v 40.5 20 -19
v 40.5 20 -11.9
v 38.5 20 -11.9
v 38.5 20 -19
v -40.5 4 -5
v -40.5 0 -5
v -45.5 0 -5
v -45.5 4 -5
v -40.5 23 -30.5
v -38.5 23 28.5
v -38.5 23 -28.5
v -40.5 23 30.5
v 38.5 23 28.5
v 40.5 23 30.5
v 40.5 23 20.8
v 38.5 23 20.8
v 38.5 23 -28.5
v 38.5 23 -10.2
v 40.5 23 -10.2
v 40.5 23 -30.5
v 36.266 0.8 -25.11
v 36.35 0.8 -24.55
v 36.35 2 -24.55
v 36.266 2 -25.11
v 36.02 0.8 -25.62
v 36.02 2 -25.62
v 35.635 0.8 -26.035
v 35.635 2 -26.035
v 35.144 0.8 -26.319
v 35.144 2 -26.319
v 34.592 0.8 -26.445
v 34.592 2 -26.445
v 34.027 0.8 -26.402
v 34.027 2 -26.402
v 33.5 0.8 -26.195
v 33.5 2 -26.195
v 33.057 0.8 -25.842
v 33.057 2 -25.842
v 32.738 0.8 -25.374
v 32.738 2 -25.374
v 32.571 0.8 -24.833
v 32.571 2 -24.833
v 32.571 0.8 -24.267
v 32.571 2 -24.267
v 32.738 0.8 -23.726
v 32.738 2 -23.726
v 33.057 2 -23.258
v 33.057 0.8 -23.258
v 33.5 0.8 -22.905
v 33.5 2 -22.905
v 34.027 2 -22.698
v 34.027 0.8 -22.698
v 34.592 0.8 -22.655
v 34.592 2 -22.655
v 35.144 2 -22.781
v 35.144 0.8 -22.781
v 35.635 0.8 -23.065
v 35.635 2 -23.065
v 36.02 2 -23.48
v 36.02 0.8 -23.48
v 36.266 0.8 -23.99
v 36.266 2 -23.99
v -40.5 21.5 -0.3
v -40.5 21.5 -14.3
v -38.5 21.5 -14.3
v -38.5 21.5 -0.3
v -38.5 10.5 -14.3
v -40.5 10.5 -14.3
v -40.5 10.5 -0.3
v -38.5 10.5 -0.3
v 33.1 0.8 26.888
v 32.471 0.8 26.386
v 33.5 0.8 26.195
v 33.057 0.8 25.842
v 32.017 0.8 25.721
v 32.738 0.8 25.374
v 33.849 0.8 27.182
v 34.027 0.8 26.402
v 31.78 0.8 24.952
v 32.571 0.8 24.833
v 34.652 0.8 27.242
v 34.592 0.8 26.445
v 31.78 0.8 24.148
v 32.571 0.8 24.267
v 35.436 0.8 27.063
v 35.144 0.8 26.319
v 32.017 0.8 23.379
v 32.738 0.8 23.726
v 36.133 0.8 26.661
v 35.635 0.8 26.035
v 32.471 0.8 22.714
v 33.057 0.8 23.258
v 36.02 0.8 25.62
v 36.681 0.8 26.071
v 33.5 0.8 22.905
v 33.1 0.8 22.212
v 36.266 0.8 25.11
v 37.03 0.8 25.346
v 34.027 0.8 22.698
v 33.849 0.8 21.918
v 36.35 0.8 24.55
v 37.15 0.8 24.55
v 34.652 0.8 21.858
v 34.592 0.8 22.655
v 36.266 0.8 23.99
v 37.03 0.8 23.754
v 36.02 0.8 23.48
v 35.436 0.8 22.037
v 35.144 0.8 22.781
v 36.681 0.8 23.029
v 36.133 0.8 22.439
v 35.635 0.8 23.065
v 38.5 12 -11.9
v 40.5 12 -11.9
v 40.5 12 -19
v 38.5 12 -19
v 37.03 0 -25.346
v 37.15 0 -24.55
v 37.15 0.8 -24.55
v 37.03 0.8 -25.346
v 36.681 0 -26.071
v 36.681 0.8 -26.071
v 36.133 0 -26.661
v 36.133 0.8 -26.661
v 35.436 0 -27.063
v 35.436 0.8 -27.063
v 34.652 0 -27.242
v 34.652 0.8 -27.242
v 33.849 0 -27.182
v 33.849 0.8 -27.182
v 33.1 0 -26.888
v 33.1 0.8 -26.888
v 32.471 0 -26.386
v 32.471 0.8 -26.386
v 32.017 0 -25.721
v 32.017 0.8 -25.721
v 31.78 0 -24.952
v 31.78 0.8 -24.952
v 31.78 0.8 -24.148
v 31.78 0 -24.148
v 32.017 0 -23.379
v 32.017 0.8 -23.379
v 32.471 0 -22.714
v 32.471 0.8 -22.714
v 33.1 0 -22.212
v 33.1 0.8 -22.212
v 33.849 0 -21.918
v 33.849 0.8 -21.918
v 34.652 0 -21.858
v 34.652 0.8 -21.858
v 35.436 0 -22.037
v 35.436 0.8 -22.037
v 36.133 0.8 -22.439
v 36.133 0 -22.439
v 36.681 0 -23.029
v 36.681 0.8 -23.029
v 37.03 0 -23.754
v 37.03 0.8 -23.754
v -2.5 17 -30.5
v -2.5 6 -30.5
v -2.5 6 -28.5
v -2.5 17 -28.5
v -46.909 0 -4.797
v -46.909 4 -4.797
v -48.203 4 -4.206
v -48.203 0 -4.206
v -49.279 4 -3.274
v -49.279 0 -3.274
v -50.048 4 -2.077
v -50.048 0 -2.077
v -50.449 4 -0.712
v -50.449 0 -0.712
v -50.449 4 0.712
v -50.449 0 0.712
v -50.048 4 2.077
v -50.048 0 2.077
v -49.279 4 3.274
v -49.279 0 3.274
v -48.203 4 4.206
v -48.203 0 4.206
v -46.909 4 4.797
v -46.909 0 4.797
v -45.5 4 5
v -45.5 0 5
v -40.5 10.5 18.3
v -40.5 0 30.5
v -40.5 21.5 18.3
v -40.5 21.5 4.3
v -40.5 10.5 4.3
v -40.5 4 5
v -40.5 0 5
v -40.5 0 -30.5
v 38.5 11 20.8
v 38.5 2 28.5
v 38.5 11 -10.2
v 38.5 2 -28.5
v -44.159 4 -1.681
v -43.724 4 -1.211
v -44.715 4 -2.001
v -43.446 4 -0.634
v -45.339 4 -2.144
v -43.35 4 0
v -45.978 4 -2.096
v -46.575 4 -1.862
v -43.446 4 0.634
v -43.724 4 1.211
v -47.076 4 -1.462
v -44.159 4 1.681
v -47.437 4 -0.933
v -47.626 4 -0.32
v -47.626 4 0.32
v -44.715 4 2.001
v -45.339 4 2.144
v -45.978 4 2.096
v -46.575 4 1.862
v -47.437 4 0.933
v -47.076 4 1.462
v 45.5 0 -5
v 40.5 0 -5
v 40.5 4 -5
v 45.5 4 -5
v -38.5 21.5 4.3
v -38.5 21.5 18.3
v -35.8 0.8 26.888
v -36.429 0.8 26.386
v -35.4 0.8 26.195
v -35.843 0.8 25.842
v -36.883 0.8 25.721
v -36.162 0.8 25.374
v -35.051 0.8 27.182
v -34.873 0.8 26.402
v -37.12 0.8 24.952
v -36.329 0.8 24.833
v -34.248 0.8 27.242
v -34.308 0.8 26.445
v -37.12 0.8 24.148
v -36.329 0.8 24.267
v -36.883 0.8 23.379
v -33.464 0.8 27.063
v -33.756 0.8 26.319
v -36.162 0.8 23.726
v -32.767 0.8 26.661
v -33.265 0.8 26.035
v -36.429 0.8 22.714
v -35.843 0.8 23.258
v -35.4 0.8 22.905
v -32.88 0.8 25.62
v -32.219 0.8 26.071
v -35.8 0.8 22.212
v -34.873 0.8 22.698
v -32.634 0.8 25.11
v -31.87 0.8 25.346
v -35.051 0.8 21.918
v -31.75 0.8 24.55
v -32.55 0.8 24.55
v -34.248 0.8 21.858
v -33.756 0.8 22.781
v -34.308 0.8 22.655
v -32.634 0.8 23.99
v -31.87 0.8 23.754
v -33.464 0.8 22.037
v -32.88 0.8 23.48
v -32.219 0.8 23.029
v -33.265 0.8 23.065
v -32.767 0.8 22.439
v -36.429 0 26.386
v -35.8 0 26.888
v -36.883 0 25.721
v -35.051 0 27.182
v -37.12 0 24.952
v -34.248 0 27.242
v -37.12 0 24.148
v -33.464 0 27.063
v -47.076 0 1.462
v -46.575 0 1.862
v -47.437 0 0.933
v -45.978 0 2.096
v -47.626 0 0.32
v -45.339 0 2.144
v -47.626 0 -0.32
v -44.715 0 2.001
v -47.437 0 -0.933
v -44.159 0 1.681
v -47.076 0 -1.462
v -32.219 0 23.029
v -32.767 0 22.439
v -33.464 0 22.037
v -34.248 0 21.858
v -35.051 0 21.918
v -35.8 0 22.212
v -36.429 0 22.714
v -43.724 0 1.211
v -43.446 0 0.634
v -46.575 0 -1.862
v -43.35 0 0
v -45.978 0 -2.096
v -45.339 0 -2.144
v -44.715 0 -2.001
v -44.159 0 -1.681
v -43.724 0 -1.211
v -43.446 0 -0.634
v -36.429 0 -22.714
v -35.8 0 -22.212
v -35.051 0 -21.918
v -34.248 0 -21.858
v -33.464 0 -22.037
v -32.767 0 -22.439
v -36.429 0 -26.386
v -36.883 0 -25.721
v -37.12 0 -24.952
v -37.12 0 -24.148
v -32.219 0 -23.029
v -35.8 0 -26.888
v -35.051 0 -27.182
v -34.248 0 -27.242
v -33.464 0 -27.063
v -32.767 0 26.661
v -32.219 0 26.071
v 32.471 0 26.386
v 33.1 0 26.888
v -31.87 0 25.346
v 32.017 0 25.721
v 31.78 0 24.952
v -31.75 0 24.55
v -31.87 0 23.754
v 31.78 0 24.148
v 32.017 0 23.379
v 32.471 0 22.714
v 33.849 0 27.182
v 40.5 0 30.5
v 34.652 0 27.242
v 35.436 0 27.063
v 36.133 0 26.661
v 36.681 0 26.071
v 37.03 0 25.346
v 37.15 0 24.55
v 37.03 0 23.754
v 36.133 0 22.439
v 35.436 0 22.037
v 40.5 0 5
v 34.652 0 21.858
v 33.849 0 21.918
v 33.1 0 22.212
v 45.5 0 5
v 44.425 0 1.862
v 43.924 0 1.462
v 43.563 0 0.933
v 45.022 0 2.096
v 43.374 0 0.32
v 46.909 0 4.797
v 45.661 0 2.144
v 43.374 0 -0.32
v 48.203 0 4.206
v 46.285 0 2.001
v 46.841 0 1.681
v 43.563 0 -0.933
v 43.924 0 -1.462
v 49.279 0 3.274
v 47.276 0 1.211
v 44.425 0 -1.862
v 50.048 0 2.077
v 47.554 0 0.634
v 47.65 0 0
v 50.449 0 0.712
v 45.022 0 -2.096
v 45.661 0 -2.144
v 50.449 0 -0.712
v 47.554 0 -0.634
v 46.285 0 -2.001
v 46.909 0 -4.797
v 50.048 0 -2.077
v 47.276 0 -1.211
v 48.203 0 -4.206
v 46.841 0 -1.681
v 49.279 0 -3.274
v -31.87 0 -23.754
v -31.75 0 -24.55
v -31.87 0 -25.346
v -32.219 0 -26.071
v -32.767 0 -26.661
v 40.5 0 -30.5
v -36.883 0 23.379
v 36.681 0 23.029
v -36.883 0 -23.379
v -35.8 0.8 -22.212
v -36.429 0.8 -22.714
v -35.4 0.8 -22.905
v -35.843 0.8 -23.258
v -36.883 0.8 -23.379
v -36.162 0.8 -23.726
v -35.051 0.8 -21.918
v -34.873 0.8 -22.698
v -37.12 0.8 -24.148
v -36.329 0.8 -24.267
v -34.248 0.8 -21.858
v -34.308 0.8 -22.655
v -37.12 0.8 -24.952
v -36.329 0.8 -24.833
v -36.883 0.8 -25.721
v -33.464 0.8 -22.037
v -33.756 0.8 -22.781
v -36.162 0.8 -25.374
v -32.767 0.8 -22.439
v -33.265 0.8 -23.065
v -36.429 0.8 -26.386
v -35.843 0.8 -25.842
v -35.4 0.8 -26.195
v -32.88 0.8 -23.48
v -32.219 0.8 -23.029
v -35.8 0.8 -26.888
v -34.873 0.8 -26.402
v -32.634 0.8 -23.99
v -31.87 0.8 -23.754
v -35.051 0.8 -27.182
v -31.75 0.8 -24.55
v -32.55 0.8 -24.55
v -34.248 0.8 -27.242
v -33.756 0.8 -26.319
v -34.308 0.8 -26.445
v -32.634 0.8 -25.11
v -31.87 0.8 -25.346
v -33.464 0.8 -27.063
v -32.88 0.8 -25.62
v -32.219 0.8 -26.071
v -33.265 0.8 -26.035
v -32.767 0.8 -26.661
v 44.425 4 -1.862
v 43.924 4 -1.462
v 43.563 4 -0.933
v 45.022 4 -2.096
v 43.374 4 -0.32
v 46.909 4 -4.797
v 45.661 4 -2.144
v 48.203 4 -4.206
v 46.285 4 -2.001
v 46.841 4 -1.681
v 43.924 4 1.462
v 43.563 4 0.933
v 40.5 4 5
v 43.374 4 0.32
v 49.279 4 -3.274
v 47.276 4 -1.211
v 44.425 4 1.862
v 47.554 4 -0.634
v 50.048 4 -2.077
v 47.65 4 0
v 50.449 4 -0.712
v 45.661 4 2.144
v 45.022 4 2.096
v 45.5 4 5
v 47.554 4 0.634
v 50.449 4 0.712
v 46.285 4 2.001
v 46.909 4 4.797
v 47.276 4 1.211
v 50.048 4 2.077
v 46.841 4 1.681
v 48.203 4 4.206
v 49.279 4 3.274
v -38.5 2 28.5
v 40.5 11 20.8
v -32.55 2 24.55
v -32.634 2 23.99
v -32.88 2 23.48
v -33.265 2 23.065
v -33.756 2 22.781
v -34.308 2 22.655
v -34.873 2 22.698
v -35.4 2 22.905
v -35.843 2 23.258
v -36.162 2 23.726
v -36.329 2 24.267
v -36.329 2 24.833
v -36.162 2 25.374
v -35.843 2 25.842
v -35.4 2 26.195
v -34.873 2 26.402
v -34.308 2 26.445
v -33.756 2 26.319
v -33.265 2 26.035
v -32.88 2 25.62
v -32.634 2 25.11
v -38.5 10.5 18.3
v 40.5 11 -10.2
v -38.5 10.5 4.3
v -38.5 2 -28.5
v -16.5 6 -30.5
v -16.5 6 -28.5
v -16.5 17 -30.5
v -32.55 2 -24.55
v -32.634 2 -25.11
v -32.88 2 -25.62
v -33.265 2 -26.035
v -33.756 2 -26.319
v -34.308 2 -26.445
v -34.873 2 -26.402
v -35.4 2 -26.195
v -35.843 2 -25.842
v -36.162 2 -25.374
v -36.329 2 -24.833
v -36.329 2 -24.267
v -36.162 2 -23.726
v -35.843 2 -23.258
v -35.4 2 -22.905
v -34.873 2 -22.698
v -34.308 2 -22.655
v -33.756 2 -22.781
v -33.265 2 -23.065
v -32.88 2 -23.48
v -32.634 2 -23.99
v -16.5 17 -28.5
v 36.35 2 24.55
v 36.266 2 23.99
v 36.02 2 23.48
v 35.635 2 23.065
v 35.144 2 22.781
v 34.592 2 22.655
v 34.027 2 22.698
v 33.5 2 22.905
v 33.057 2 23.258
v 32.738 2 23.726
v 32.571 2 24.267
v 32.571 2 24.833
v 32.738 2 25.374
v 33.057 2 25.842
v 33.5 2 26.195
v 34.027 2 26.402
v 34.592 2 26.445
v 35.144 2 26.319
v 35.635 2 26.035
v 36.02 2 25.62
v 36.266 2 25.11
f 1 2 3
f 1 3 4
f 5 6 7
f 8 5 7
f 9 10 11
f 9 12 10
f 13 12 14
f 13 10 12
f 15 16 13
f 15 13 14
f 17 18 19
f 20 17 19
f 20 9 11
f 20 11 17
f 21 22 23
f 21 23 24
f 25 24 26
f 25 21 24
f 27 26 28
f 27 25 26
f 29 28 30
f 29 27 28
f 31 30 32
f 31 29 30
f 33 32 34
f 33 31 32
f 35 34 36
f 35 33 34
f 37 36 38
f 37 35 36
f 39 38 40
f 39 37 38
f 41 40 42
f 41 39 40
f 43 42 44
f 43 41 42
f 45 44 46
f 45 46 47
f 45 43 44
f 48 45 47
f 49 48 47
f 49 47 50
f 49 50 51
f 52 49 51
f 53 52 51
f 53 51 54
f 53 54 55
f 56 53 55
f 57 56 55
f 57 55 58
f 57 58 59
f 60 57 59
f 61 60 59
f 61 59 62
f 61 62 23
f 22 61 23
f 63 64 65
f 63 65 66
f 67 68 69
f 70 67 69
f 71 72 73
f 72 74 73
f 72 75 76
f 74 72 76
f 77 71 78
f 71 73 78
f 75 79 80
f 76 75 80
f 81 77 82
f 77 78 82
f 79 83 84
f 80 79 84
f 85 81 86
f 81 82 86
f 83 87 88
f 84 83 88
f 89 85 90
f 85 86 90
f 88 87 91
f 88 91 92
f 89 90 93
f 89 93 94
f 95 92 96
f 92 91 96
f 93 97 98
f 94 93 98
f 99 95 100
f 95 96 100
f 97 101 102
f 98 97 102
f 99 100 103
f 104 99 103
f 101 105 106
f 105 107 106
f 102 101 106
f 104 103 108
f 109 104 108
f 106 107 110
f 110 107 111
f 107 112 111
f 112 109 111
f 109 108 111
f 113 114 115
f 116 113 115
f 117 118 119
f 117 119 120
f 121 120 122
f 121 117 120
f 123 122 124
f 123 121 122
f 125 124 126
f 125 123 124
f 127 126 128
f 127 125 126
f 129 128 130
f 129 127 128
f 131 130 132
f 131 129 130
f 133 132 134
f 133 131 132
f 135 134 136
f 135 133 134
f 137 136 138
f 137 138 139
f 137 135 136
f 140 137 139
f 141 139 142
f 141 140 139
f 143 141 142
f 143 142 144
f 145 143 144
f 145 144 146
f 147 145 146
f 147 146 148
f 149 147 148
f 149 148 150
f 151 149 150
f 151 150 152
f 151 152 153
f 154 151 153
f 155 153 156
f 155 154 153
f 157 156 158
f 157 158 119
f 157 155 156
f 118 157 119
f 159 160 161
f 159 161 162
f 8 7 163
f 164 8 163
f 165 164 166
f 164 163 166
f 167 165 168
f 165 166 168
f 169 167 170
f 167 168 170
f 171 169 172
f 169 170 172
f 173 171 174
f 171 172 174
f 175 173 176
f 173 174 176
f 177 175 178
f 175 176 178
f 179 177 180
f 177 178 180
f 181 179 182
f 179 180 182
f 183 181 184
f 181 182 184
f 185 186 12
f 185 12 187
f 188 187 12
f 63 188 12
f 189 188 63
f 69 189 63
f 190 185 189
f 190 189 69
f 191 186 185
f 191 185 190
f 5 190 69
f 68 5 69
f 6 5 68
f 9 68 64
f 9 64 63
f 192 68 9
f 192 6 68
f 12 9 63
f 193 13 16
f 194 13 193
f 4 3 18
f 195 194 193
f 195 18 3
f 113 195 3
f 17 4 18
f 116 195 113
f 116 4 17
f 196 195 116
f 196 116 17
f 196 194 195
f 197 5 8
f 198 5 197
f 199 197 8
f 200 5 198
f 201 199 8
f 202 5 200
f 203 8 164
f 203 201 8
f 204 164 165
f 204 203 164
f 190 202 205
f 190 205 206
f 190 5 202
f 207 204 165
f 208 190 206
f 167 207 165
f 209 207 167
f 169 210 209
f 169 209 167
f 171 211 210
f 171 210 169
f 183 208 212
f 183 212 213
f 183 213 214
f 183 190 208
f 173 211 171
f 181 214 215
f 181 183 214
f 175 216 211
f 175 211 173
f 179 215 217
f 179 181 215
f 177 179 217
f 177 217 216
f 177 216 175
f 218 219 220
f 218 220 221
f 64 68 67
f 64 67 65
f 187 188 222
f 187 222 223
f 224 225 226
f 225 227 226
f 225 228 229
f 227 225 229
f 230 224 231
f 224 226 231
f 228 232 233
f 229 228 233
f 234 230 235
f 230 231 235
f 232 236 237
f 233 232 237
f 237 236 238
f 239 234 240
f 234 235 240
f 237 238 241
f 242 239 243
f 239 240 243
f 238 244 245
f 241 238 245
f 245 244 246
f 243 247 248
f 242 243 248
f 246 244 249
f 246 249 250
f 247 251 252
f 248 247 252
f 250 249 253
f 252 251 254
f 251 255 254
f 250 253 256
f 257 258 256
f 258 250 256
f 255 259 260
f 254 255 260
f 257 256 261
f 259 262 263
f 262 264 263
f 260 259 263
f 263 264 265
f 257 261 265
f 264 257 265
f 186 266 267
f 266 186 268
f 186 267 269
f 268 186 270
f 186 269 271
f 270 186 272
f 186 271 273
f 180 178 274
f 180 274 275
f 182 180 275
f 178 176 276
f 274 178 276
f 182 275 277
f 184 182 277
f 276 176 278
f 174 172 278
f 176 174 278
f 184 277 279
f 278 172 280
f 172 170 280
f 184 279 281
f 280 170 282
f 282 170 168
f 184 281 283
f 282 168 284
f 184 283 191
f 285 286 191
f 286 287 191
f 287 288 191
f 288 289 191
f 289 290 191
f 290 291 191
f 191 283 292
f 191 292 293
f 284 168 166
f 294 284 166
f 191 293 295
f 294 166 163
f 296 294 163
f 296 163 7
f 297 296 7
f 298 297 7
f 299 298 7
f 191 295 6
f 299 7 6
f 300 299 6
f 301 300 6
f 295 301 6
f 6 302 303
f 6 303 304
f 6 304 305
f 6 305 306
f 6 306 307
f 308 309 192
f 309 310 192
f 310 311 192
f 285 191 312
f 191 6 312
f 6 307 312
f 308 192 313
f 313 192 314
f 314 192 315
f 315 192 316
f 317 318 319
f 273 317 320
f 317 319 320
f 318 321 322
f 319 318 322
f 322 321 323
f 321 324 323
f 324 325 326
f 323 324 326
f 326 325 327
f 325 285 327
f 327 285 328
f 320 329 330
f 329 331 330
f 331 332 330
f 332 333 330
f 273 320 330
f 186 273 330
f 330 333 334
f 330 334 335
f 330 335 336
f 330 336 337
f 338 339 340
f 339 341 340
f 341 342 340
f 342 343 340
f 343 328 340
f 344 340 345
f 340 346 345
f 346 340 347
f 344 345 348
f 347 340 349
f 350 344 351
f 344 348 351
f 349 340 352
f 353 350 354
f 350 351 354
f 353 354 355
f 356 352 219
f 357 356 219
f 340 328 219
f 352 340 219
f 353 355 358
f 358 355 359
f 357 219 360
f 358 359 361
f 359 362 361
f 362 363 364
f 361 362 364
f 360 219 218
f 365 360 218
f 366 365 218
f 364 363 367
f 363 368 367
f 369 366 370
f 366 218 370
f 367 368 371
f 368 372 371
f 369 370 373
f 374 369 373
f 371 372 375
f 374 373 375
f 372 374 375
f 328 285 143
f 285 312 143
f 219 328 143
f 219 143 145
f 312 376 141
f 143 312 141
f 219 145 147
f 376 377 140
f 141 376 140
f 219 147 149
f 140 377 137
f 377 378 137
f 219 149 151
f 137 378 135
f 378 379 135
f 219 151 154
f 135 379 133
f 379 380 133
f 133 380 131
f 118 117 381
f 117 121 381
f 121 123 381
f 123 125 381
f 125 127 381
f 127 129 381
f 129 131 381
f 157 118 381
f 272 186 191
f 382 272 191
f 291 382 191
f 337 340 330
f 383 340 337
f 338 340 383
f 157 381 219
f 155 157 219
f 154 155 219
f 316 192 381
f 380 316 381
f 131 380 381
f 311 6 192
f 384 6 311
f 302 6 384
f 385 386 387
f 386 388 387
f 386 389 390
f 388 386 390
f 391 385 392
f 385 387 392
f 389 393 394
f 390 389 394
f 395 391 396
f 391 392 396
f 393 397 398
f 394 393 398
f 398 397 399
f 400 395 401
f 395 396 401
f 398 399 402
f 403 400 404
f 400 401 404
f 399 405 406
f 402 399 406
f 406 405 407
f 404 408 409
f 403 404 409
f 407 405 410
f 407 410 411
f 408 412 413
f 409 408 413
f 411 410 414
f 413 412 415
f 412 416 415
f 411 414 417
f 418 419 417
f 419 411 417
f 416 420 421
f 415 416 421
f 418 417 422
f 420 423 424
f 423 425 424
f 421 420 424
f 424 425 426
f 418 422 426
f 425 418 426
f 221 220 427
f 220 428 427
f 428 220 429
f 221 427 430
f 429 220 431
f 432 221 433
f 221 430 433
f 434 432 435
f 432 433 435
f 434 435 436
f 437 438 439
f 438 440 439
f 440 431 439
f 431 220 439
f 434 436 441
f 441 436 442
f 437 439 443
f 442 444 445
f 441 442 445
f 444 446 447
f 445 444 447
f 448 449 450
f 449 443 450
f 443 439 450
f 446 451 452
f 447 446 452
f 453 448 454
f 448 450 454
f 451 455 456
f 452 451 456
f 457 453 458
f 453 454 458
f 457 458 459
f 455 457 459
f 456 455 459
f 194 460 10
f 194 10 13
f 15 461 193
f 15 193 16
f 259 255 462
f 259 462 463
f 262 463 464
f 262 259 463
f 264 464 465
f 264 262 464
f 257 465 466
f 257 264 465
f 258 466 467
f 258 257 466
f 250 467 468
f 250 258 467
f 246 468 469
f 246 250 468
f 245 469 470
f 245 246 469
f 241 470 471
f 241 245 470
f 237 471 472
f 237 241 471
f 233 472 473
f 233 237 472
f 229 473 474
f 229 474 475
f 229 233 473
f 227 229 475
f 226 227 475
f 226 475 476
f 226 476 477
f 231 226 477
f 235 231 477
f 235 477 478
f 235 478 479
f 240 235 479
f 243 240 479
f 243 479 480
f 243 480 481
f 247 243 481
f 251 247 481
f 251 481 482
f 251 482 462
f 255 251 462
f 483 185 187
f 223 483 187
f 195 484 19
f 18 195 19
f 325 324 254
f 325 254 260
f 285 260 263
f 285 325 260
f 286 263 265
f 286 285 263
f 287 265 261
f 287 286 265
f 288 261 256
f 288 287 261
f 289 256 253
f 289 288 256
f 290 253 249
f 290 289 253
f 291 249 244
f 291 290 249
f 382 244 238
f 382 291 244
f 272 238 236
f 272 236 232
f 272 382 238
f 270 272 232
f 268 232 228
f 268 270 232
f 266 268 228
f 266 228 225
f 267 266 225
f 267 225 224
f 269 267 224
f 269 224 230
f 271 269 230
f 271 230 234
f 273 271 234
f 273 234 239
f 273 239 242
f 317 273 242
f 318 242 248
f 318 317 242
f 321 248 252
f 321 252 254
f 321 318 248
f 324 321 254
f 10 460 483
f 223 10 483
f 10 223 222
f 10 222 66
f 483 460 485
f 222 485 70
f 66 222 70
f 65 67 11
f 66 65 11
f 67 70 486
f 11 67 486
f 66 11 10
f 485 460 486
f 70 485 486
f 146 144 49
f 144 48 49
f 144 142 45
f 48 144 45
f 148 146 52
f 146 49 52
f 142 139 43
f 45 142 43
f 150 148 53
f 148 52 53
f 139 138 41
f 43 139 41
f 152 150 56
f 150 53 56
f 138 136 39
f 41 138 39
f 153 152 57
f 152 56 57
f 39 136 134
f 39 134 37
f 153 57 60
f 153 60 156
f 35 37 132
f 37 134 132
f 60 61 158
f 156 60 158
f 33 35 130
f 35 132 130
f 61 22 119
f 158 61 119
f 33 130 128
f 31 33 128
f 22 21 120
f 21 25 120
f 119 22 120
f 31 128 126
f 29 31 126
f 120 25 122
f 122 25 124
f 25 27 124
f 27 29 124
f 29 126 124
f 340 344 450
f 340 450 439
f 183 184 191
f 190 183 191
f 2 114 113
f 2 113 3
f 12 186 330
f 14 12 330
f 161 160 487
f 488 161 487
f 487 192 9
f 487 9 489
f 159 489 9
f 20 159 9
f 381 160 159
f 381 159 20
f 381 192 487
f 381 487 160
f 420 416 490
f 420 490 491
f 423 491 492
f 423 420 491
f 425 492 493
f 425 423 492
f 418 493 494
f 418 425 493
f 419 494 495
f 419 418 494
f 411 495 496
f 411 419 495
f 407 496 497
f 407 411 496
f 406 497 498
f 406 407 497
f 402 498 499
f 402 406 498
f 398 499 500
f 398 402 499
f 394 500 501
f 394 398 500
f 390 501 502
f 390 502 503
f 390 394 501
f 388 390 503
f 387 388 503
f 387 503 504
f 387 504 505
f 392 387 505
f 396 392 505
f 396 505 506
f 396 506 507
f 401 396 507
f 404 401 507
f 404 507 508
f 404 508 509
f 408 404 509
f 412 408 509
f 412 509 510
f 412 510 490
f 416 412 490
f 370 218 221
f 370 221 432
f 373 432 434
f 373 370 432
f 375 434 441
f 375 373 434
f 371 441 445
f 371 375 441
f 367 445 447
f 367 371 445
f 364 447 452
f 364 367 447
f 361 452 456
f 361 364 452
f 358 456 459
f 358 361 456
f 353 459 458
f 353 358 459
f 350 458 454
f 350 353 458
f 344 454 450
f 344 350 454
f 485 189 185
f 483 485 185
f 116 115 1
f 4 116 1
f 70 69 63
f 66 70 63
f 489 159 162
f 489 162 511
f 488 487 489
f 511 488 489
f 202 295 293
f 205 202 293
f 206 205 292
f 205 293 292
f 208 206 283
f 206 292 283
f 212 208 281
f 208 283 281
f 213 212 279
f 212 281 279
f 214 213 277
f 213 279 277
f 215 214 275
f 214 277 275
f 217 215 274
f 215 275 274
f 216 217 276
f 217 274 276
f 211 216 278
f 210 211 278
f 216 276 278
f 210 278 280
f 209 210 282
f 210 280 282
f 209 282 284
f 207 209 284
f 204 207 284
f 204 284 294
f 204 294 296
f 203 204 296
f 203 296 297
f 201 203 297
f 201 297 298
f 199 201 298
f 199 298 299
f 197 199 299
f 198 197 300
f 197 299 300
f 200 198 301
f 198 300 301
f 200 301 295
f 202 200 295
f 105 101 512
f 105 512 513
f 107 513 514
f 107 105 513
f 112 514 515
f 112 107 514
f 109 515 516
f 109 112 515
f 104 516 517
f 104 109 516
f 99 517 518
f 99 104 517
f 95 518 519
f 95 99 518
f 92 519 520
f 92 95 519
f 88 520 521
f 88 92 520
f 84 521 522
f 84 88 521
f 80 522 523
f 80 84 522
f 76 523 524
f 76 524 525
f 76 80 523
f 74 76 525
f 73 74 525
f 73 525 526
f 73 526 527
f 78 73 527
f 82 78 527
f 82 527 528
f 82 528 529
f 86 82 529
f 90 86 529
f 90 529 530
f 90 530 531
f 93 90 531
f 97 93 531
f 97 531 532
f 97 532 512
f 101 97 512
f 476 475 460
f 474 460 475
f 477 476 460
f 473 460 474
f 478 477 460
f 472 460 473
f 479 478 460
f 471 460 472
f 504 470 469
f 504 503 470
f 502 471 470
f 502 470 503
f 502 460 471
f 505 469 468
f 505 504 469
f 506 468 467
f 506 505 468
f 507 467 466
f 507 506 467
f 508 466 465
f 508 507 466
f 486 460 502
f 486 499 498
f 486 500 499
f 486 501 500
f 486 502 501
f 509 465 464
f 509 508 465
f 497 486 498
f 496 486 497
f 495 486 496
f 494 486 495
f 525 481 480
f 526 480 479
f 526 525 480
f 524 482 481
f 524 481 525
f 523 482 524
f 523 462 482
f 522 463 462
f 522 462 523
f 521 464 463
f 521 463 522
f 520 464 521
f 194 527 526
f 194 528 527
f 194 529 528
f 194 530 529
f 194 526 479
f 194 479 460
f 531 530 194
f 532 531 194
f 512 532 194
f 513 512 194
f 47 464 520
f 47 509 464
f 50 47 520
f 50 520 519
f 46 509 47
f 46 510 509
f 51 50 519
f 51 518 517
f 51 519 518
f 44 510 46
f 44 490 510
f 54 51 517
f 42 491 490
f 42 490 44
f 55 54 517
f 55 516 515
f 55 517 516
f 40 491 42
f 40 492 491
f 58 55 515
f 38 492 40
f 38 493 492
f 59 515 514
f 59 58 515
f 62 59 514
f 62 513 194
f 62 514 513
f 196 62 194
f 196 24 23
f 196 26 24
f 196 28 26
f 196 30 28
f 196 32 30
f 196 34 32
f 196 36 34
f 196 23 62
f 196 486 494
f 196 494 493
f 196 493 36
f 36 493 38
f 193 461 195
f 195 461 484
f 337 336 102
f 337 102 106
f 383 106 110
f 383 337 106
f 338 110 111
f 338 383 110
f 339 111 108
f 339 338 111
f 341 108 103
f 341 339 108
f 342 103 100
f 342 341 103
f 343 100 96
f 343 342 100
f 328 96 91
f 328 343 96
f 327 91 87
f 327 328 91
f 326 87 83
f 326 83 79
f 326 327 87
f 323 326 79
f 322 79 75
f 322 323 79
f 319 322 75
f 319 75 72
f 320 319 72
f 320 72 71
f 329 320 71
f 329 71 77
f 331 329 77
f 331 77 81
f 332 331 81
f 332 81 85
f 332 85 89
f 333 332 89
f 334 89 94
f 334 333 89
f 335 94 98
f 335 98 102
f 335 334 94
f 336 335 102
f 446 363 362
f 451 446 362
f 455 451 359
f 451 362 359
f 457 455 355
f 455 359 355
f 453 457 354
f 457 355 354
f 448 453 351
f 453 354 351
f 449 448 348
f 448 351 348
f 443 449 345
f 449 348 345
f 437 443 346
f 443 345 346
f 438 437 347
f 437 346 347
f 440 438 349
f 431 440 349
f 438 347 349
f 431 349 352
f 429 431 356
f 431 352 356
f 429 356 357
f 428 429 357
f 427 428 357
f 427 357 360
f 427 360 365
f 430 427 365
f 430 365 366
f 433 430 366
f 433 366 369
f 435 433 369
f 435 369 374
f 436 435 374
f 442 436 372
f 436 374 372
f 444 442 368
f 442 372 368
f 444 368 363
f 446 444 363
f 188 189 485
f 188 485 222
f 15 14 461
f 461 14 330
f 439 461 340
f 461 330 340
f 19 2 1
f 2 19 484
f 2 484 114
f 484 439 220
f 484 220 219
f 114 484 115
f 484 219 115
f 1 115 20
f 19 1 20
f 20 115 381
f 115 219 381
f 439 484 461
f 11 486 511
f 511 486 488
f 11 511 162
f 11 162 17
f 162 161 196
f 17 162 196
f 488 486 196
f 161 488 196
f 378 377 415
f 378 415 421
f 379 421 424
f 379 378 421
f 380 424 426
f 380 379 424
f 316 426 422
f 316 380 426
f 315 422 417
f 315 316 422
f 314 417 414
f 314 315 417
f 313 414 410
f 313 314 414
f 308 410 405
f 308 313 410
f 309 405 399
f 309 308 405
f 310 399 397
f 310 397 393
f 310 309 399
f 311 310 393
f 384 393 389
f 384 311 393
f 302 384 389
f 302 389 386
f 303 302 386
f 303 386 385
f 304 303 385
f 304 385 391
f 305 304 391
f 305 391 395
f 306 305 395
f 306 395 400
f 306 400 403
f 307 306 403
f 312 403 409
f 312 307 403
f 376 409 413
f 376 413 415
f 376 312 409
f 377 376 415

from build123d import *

# Parameters (mm, degrees)
SKETCH_1_W          = 81
SKETCH_1_H          = 61
EXTRUDE_1_DEPTH     = 23
SHELL_1_T           = -2
SKETCH_2_R          = 2.15
EXTRUDE_3_DEPTH     = 4
SKETCH_3_R          = 1.9
CUT_EXTRUDE_1_DEPTH = 2
SKETCH_4_R          = 2.7
SKETCH_4_R_2        = 1.9
CUT_EXTRUDE_2_DEPTH = 0.8
SKETCH_5_W          = 31
SKETCH_5_H          = 12
SKETCH_5_W_2        = 7.1
SKETCH_5_H_2        = 8
CUT_EXTRUDE_3_DEPTH = 2
SKETCH_6_W          = 14
SKETCH_6_H          = 11
CUT_EXTRUDE_4_DEPTH = 2
SKETCH_7_W          = 14
SKETCH_7_H          = 11
CUT_EXTRUDE_5_DEPTH = 2


with BuildPart() as part:
    # 草图1 → 凸台-拉伸1 (new body)
    with BuildSketch(Plane(origin=(0, 0, 0), x_dir=(1, 0, 0), z_dir=(0, 1, 0))):
        Rectangle(SKETCH_1_W, SKETCH_1_H)
    extrude(amount=EXTRUDE_1_DEPTH)

    # 抽壳1
    shell_1_openings = [part.faces().sort_by_distance(p)[0] for p in [
        (0, 23, 0),
    ]]
    offset(amount=SHELL_1_T, openings=shell_1_openings, kind=Kind.INTERSECTION)

    # 草图2 → 凸台-拉伸3 (add)
    with BuildSketch(Plane.XZ):
        with BuildLine():
            Line((-45.5, 5), (-40.5, 5))
            Line((-40.5, 5), (-40.5, -5))
            Line((-40.5, -5), (-45.5, -5))
            ThreePointArc((-45.5, -5), (-50.5, 0), (-45.5, 5))
        make_face()
        with Locations((-45.5, 0)):
            Circle(SKETCH_2_R, mode=Mode.SUBTRACT)
        with BuildLine():
            Line((40.5, -5), (45.5, -5))
            ThreePointArc((45.5, -5), (50.5, 0), (45.5, 5))
            Line((45.5, 5), (40.5, 5))
            Line((40.5, 5), (40.5, -5))
        make_face()
        with Locations((45.5, 0)):
            Circle(SKETCH_2_R, mode=Mode.SUBTRACT)
    extrude(amount=-EXTRUDE_3_DEPTH)

    # 草图3 → 切除-拉伸1 (cut)
    with BuildSketch(Plane(origin=(0, 0, 0), x_dir=(1, 0, 0), z_dir=(0, 1, 0))):
        with Locations((-34.45, -24.55)):
            Circle(SKETCH_3_R)
        with Locations((-34.45, 24.55)):
            Circle(SKETCH_3_R)
        with Locations((34.45, 24.55)):
            Circle(SKETCH_3_R)
        with Locations((34.45, -24.55)):
            Circle(SKETCH_3_R)
    extrude(amount=CUT_EXTRUDE_1_DEPTH, mode=Mode.SUBTRACT)

    # 草图4 → 切除-拉伸2 (cut)
    with BuildSketch(Plane(origin=(0, 0, 0), x_dir=(1, 0, 0), z_dir=(0, 1, 0))):
        with Locations((-34.45, -24.55)):
            Circle(SKETCH_4_R)
        with Locations((-34.45, -24.55)):
            Circle(SKETCH_4_R_2, mode=Mode.SUBTRACT)
        with Locations((-34.45, 24.55)):
            Circle(SKETCH_4_R)
        with Locations((-34.45, 24.55)):
            Circle(SKETCH_4_R_2, mode=Mode.SUBTRACT)
        with Locations((34.45, 24.55)):
            Circle(SKETCH_4_R)
        with Locations((34.45, 24.55)):
            Circle(SKETCH_4_R_2, mode=Mode.SUBTRACT)
        with Locations((34.45, -24.55)):
            Circle(SKETCH_4_R)
        with Locations((34.45, -24.55)):
            Circle(SKETCH_4_R_2, mode=Mode.SUBTRACT)
    extrude(amount=CUT_EXTRUDE_2_DEPTH, mode=Mode.SUBTRACT)

    # 草图5 → 切除-拉伸3 (cut)
    with BuildSketch(Plane(origin=(40.5, 0, 0), x_dir=(0, 0, -1), z_dir=(1, 0, 0))):
        with Locations((-5.3, 17)):
            Rectangle(SKETCH_5_W, SKETCH_5_H)
        with Locations((15.45, 16)):
            Rectangle(SKETCH_5_W_2, SKETCH_5_H_2)
    extrude(amount=-CUT_EXTRUDE_3_DEPTH, mode=Mode.SUBTRACT)

    # 草图6 → 切除-拉伸4 (cut)
    with BuildSketch(Plane(origin=(0, 0, -30.5), x_dir=(-1, 0, 0), z_dir=(0, 0, -1))):
        with Locations((9.5, 11.5)):
            Rectangle(SKETCH_6_W, SKETCH_6_H)
    extrude(amount=-CUT_EXTRUDE_4_DEPTH, mode=Mode.SUBTRACT)

    # 草图7 → 切除-拉伸5 (cut)
    with BuildSketch(Plane.ZY.offset(40.5)):
        with Locations((11.3, 16)):
            Rectangle(SKETCH_7_W, SKETCH_7_H)
        with Locations((-7.3, 16)):
            Rectangle(SKETCH_7_W, SKETCH_7_H)
    extrude(amount=-CUT_EXTRUDE_5_DEPTH, mode=Mode.SUBTRACT)


solid = part.part
